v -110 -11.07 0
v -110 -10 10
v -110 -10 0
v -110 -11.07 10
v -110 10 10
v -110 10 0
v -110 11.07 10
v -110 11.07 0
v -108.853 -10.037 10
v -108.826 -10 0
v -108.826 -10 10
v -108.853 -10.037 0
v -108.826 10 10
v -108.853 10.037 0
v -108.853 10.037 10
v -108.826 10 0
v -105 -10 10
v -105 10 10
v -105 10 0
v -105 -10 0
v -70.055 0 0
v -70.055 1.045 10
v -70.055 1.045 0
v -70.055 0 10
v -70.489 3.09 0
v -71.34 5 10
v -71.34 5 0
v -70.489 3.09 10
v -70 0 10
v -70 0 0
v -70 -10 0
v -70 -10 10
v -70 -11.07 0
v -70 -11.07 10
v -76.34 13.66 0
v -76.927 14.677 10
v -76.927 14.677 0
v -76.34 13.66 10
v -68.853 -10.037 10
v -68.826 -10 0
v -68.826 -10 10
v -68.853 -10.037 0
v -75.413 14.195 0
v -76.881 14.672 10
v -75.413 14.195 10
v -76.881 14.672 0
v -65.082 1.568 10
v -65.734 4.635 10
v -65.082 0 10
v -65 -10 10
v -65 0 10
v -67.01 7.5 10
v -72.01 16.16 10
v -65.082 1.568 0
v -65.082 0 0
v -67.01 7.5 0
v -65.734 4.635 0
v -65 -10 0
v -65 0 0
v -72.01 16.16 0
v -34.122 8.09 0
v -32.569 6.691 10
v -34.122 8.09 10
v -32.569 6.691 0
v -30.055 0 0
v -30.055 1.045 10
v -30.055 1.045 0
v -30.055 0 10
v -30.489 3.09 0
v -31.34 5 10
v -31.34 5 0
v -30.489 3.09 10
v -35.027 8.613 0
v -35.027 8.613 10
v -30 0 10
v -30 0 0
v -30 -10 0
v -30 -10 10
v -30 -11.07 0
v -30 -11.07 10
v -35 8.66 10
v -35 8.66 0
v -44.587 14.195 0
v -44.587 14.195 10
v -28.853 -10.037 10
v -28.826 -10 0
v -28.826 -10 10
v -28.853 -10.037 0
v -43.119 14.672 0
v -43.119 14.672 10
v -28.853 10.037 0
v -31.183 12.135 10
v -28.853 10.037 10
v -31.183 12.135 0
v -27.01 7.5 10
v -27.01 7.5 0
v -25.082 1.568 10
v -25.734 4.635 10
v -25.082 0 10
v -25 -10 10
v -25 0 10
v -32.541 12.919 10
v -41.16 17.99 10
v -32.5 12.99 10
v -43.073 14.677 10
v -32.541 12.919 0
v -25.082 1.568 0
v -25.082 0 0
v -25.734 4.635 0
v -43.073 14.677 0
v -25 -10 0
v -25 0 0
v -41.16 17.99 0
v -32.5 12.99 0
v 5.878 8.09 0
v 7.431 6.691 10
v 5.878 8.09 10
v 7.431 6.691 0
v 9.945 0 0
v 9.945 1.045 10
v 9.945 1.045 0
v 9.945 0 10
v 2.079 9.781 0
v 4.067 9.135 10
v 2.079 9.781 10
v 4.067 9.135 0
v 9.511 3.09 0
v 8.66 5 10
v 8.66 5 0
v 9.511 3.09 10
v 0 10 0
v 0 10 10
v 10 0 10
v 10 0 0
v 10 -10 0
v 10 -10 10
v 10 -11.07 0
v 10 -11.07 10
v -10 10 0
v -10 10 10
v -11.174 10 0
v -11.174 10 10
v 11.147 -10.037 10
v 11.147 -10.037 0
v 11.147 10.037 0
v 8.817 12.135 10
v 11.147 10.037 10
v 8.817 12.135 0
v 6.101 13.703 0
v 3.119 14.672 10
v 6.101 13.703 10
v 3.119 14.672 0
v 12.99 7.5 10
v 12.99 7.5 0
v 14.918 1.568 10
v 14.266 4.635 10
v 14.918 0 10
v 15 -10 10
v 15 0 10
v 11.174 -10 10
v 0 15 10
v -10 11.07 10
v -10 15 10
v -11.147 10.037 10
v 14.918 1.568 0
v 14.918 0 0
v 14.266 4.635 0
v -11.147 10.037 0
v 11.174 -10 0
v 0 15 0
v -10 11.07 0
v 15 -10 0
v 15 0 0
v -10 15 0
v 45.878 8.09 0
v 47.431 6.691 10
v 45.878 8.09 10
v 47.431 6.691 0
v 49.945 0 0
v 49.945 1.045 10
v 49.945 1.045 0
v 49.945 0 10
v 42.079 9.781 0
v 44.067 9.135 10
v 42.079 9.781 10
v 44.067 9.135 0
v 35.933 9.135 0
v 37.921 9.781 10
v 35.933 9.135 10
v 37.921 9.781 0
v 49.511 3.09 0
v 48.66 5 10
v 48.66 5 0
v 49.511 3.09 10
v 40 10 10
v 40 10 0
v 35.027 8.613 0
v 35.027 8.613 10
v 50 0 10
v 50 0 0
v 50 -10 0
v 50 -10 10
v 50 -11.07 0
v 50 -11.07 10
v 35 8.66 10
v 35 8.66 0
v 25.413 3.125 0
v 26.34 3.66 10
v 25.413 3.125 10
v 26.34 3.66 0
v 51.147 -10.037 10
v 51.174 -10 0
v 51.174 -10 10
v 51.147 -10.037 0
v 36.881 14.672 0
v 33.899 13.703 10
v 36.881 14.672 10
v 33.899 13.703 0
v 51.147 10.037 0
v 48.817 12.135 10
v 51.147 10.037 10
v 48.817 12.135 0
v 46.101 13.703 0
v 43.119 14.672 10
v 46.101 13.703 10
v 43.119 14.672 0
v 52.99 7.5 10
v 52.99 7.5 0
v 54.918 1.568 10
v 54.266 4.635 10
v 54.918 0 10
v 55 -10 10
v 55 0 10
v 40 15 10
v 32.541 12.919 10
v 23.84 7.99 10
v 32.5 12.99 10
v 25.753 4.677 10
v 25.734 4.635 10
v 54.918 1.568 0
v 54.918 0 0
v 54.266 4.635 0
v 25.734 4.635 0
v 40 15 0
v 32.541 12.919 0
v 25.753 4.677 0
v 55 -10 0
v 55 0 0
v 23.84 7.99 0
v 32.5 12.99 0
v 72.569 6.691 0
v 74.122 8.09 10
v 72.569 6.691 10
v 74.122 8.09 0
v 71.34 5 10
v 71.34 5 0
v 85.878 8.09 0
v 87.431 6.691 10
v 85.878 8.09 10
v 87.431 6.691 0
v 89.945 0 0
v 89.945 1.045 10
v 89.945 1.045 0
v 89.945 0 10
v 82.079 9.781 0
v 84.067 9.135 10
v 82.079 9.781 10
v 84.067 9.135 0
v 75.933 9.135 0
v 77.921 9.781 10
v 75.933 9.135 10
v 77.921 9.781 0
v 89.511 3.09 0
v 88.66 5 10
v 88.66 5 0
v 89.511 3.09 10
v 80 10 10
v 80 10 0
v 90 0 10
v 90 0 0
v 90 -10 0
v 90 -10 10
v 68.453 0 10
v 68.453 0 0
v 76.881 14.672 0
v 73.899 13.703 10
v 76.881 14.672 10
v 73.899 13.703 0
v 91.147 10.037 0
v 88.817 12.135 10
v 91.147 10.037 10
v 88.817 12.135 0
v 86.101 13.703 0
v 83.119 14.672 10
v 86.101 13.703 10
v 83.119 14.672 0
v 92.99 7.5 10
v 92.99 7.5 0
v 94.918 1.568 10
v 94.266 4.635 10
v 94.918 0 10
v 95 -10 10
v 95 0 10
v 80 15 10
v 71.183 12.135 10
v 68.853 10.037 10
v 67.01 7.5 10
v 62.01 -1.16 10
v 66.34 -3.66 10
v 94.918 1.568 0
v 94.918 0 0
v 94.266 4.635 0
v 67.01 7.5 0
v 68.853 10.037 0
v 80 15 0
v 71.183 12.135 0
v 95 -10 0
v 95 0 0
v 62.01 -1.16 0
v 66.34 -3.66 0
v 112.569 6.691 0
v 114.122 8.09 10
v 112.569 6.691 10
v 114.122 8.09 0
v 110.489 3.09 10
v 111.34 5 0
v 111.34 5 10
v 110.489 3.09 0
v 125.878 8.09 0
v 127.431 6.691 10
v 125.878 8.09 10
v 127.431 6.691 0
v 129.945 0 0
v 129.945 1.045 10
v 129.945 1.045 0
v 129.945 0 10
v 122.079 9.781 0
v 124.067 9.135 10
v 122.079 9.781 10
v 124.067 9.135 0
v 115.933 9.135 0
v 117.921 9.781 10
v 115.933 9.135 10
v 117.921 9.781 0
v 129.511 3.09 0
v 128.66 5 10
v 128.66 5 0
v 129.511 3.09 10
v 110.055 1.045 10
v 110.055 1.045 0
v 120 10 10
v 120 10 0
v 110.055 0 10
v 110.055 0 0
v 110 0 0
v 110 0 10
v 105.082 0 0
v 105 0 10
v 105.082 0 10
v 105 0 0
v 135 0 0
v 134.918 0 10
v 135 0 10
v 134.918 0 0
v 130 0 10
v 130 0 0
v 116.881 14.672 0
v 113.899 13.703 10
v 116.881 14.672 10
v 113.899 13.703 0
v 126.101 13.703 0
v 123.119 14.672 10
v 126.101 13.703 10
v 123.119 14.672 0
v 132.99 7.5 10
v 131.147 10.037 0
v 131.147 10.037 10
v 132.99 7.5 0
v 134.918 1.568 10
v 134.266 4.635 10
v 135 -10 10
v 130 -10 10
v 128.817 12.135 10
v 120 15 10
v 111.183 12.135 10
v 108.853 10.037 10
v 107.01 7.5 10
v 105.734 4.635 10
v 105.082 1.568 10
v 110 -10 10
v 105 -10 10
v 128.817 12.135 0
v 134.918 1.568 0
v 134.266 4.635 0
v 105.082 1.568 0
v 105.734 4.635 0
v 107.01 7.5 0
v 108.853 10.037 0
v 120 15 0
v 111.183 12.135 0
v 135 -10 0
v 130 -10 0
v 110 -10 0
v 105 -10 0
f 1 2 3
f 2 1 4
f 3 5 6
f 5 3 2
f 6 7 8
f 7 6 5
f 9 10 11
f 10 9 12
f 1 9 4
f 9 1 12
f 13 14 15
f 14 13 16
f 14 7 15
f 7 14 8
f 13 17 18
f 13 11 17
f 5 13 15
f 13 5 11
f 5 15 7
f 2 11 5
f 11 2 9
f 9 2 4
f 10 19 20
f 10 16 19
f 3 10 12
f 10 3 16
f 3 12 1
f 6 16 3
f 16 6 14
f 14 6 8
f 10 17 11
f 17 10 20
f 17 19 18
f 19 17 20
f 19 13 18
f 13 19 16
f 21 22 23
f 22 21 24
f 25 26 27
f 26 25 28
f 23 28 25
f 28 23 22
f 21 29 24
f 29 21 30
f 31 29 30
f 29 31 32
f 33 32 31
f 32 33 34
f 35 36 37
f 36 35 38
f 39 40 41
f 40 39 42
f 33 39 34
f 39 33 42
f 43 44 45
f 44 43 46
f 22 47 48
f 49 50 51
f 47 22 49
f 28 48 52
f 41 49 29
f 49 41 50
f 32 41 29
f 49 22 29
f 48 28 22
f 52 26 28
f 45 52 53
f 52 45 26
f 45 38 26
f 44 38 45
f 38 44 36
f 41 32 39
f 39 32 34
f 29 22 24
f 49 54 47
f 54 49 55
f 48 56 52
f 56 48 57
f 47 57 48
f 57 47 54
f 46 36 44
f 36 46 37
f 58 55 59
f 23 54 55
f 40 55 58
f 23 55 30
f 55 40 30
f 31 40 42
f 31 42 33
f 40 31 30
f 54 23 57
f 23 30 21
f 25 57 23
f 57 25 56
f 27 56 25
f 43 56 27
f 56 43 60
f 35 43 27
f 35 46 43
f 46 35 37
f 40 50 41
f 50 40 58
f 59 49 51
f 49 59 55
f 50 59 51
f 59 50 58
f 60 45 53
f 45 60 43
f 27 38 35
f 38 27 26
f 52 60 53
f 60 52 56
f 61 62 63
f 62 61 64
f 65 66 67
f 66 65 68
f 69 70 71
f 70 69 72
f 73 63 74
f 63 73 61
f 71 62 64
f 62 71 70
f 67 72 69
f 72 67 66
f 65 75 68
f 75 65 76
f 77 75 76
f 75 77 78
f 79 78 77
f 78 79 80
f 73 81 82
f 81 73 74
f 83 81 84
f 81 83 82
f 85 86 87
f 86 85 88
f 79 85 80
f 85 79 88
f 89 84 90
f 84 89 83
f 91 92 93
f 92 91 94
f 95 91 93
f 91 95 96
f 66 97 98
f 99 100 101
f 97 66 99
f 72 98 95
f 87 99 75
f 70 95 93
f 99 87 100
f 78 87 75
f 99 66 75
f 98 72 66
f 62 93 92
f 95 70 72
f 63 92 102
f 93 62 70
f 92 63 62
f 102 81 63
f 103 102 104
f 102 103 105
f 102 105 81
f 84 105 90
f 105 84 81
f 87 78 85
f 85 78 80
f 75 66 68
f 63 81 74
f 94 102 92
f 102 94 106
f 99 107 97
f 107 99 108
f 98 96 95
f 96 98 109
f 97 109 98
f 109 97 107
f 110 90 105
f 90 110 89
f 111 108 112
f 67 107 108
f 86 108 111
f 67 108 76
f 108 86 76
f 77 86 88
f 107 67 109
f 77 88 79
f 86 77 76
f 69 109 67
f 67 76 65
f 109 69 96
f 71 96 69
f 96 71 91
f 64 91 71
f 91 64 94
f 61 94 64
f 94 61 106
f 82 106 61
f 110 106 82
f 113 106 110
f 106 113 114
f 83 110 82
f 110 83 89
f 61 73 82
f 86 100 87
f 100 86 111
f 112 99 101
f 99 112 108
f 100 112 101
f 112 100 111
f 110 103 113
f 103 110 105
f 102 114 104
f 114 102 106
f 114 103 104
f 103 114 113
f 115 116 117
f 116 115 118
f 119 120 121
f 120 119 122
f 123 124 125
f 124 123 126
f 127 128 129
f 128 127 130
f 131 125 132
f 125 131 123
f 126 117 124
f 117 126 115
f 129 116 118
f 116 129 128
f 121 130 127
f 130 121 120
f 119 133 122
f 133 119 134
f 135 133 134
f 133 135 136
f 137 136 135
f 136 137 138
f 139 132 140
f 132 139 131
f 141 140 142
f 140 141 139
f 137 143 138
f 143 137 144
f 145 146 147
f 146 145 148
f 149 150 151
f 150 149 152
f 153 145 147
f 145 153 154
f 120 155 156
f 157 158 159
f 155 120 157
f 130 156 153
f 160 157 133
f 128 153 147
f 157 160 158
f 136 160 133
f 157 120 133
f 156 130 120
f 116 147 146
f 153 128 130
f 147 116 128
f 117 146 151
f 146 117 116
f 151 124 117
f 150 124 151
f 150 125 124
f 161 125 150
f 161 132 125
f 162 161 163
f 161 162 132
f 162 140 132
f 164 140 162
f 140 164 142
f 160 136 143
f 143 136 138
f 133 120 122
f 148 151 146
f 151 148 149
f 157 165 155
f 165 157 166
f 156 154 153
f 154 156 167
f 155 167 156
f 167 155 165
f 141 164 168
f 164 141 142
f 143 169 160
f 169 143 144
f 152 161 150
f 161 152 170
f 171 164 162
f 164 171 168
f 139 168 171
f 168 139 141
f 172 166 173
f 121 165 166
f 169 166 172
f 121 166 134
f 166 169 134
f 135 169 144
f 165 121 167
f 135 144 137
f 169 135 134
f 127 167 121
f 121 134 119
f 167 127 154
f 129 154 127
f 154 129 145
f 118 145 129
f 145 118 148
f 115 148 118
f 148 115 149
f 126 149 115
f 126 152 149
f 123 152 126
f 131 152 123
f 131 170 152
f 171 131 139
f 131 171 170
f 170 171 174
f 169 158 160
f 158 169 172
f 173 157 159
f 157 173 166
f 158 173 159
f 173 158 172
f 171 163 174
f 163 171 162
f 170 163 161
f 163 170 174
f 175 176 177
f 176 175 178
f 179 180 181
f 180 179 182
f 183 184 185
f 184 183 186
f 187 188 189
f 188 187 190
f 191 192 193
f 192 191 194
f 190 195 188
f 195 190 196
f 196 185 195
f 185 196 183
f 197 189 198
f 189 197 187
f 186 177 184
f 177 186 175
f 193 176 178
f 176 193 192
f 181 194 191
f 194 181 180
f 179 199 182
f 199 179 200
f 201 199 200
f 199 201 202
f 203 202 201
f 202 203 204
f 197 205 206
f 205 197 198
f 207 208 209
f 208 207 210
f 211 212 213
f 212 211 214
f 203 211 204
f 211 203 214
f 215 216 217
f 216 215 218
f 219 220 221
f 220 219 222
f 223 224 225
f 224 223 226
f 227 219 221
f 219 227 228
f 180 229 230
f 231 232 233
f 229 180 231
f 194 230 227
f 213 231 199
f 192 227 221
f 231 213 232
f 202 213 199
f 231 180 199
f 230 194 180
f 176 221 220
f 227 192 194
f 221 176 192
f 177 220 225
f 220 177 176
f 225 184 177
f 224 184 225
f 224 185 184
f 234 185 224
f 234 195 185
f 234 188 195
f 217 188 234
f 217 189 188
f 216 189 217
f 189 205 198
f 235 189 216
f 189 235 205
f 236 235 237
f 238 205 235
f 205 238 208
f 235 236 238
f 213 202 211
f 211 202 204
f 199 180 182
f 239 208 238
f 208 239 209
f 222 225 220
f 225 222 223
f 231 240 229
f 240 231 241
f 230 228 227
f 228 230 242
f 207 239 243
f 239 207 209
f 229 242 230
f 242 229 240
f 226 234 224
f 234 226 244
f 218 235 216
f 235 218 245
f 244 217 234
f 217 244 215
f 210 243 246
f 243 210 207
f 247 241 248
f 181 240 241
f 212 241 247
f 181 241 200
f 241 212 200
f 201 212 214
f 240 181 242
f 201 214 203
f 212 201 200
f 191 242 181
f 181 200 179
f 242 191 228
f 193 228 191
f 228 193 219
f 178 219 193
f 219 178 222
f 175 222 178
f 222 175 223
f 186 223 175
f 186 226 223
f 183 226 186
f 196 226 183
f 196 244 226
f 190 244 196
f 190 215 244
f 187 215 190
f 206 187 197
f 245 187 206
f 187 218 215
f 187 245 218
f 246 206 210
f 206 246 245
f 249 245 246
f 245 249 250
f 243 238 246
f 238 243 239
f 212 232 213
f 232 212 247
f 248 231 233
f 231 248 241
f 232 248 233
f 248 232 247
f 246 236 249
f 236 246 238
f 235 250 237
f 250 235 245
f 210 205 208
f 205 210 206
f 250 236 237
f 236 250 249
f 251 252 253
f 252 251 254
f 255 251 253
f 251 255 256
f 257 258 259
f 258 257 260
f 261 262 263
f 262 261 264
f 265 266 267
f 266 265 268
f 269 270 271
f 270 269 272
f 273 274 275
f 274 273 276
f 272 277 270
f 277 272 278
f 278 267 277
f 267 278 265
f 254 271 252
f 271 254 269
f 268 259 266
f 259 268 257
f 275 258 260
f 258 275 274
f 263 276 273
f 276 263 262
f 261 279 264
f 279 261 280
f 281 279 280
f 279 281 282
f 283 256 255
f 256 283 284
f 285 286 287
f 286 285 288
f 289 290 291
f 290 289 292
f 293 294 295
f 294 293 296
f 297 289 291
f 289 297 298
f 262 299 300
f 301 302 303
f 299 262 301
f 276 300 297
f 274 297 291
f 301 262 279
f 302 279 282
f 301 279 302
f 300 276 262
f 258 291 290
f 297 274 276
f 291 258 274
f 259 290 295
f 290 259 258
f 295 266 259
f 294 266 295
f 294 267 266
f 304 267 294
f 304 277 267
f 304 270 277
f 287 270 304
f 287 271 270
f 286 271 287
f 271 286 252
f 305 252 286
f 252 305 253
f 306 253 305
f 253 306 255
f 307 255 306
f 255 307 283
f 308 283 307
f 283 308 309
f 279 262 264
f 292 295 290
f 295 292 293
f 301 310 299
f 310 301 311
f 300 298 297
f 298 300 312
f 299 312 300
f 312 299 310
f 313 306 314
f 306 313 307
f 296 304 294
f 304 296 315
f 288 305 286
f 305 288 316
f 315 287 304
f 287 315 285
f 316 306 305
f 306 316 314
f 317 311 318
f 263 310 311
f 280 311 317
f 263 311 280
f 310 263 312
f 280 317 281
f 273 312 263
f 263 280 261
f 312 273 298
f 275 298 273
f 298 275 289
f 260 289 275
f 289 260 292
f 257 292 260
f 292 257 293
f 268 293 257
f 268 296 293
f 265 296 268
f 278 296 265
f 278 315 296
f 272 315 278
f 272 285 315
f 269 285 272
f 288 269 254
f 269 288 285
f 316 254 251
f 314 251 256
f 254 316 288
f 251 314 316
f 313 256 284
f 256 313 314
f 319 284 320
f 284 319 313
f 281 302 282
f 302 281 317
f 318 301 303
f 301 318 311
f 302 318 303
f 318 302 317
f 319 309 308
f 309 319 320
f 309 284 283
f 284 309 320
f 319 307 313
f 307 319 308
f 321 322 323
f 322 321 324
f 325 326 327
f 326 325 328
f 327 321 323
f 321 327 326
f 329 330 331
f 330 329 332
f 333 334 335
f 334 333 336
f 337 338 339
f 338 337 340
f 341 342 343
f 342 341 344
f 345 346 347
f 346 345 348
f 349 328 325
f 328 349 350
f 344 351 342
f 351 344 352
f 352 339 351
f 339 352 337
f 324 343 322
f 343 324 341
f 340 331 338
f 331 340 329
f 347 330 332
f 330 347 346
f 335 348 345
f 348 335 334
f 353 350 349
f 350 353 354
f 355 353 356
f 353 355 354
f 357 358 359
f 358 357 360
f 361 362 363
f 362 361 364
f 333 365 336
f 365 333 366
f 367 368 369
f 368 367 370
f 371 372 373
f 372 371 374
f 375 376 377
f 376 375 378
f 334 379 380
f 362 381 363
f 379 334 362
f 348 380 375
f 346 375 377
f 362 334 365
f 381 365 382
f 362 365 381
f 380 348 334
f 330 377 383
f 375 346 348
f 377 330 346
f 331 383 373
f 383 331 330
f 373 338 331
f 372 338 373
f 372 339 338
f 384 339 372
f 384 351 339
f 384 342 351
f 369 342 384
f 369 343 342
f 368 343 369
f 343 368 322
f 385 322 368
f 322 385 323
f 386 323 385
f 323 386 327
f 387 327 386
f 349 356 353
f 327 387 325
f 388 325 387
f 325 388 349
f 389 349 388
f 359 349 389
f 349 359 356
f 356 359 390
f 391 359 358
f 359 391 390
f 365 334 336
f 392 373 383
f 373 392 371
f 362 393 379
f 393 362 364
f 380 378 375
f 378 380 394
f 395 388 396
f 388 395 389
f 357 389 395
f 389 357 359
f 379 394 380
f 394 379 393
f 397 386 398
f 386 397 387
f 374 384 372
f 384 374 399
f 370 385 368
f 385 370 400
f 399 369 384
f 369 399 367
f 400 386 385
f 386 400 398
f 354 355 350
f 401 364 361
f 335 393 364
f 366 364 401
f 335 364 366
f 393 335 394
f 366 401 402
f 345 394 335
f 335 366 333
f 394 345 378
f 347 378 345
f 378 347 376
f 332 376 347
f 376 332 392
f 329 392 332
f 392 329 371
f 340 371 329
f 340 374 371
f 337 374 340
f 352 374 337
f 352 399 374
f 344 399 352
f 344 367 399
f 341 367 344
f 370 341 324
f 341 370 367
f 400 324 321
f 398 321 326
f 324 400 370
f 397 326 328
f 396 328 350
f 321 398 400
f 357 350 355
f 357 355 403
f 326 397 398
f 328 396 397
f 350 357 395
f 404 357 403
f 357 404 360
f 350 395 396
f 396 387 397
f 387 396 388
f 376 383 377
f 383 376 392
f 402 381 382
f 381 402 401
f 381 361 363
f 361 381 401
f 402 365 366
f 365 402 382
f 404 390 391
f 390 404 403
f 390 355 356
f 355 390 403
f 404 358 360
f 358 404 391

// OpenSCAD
// (c) 2011 Christopher "ScribbleJ" Jansen
// 
// bend() module - creates a cube with a U or L shaped bend of the specified
// radius.

// d1 = length of first cube segment
// d2 = length of second cube segment
// r = (inner) radius of bend
// w = width of cube
// a = angle of bend.  0 = U, 180 = ---
// h = height of cube
bend_demo();

module bend_demo()
{
  translate([-40*3,0,0])
  rotate([0,0,-90])
  for(i = [0:6])
    translate([0,40*i,0]) bend(a=(6-i)*30);
}

module bend(d1=10,d2=10,r=10,w=5,a=0,h=10)
{
  huge = r*w;
  difference()
  {
    cylinder(r=r+w, h=h);

    translate([0,0,-0.5]) 
    {
      cylinder(r=r, h=h+1);
      translate([0,r-huge,0]) cube([huge, huge, h+1]);
      rotate([0,0,-a]) translate([0,-r,0]) cube([huge, huge, h+1]);
    }
  }

  translate([0,r,0]) cube([d1, w, h]);
  rotate([0,0,-a]) translate([0,-(r+w),0]) cube([d2, w, h]);
}
